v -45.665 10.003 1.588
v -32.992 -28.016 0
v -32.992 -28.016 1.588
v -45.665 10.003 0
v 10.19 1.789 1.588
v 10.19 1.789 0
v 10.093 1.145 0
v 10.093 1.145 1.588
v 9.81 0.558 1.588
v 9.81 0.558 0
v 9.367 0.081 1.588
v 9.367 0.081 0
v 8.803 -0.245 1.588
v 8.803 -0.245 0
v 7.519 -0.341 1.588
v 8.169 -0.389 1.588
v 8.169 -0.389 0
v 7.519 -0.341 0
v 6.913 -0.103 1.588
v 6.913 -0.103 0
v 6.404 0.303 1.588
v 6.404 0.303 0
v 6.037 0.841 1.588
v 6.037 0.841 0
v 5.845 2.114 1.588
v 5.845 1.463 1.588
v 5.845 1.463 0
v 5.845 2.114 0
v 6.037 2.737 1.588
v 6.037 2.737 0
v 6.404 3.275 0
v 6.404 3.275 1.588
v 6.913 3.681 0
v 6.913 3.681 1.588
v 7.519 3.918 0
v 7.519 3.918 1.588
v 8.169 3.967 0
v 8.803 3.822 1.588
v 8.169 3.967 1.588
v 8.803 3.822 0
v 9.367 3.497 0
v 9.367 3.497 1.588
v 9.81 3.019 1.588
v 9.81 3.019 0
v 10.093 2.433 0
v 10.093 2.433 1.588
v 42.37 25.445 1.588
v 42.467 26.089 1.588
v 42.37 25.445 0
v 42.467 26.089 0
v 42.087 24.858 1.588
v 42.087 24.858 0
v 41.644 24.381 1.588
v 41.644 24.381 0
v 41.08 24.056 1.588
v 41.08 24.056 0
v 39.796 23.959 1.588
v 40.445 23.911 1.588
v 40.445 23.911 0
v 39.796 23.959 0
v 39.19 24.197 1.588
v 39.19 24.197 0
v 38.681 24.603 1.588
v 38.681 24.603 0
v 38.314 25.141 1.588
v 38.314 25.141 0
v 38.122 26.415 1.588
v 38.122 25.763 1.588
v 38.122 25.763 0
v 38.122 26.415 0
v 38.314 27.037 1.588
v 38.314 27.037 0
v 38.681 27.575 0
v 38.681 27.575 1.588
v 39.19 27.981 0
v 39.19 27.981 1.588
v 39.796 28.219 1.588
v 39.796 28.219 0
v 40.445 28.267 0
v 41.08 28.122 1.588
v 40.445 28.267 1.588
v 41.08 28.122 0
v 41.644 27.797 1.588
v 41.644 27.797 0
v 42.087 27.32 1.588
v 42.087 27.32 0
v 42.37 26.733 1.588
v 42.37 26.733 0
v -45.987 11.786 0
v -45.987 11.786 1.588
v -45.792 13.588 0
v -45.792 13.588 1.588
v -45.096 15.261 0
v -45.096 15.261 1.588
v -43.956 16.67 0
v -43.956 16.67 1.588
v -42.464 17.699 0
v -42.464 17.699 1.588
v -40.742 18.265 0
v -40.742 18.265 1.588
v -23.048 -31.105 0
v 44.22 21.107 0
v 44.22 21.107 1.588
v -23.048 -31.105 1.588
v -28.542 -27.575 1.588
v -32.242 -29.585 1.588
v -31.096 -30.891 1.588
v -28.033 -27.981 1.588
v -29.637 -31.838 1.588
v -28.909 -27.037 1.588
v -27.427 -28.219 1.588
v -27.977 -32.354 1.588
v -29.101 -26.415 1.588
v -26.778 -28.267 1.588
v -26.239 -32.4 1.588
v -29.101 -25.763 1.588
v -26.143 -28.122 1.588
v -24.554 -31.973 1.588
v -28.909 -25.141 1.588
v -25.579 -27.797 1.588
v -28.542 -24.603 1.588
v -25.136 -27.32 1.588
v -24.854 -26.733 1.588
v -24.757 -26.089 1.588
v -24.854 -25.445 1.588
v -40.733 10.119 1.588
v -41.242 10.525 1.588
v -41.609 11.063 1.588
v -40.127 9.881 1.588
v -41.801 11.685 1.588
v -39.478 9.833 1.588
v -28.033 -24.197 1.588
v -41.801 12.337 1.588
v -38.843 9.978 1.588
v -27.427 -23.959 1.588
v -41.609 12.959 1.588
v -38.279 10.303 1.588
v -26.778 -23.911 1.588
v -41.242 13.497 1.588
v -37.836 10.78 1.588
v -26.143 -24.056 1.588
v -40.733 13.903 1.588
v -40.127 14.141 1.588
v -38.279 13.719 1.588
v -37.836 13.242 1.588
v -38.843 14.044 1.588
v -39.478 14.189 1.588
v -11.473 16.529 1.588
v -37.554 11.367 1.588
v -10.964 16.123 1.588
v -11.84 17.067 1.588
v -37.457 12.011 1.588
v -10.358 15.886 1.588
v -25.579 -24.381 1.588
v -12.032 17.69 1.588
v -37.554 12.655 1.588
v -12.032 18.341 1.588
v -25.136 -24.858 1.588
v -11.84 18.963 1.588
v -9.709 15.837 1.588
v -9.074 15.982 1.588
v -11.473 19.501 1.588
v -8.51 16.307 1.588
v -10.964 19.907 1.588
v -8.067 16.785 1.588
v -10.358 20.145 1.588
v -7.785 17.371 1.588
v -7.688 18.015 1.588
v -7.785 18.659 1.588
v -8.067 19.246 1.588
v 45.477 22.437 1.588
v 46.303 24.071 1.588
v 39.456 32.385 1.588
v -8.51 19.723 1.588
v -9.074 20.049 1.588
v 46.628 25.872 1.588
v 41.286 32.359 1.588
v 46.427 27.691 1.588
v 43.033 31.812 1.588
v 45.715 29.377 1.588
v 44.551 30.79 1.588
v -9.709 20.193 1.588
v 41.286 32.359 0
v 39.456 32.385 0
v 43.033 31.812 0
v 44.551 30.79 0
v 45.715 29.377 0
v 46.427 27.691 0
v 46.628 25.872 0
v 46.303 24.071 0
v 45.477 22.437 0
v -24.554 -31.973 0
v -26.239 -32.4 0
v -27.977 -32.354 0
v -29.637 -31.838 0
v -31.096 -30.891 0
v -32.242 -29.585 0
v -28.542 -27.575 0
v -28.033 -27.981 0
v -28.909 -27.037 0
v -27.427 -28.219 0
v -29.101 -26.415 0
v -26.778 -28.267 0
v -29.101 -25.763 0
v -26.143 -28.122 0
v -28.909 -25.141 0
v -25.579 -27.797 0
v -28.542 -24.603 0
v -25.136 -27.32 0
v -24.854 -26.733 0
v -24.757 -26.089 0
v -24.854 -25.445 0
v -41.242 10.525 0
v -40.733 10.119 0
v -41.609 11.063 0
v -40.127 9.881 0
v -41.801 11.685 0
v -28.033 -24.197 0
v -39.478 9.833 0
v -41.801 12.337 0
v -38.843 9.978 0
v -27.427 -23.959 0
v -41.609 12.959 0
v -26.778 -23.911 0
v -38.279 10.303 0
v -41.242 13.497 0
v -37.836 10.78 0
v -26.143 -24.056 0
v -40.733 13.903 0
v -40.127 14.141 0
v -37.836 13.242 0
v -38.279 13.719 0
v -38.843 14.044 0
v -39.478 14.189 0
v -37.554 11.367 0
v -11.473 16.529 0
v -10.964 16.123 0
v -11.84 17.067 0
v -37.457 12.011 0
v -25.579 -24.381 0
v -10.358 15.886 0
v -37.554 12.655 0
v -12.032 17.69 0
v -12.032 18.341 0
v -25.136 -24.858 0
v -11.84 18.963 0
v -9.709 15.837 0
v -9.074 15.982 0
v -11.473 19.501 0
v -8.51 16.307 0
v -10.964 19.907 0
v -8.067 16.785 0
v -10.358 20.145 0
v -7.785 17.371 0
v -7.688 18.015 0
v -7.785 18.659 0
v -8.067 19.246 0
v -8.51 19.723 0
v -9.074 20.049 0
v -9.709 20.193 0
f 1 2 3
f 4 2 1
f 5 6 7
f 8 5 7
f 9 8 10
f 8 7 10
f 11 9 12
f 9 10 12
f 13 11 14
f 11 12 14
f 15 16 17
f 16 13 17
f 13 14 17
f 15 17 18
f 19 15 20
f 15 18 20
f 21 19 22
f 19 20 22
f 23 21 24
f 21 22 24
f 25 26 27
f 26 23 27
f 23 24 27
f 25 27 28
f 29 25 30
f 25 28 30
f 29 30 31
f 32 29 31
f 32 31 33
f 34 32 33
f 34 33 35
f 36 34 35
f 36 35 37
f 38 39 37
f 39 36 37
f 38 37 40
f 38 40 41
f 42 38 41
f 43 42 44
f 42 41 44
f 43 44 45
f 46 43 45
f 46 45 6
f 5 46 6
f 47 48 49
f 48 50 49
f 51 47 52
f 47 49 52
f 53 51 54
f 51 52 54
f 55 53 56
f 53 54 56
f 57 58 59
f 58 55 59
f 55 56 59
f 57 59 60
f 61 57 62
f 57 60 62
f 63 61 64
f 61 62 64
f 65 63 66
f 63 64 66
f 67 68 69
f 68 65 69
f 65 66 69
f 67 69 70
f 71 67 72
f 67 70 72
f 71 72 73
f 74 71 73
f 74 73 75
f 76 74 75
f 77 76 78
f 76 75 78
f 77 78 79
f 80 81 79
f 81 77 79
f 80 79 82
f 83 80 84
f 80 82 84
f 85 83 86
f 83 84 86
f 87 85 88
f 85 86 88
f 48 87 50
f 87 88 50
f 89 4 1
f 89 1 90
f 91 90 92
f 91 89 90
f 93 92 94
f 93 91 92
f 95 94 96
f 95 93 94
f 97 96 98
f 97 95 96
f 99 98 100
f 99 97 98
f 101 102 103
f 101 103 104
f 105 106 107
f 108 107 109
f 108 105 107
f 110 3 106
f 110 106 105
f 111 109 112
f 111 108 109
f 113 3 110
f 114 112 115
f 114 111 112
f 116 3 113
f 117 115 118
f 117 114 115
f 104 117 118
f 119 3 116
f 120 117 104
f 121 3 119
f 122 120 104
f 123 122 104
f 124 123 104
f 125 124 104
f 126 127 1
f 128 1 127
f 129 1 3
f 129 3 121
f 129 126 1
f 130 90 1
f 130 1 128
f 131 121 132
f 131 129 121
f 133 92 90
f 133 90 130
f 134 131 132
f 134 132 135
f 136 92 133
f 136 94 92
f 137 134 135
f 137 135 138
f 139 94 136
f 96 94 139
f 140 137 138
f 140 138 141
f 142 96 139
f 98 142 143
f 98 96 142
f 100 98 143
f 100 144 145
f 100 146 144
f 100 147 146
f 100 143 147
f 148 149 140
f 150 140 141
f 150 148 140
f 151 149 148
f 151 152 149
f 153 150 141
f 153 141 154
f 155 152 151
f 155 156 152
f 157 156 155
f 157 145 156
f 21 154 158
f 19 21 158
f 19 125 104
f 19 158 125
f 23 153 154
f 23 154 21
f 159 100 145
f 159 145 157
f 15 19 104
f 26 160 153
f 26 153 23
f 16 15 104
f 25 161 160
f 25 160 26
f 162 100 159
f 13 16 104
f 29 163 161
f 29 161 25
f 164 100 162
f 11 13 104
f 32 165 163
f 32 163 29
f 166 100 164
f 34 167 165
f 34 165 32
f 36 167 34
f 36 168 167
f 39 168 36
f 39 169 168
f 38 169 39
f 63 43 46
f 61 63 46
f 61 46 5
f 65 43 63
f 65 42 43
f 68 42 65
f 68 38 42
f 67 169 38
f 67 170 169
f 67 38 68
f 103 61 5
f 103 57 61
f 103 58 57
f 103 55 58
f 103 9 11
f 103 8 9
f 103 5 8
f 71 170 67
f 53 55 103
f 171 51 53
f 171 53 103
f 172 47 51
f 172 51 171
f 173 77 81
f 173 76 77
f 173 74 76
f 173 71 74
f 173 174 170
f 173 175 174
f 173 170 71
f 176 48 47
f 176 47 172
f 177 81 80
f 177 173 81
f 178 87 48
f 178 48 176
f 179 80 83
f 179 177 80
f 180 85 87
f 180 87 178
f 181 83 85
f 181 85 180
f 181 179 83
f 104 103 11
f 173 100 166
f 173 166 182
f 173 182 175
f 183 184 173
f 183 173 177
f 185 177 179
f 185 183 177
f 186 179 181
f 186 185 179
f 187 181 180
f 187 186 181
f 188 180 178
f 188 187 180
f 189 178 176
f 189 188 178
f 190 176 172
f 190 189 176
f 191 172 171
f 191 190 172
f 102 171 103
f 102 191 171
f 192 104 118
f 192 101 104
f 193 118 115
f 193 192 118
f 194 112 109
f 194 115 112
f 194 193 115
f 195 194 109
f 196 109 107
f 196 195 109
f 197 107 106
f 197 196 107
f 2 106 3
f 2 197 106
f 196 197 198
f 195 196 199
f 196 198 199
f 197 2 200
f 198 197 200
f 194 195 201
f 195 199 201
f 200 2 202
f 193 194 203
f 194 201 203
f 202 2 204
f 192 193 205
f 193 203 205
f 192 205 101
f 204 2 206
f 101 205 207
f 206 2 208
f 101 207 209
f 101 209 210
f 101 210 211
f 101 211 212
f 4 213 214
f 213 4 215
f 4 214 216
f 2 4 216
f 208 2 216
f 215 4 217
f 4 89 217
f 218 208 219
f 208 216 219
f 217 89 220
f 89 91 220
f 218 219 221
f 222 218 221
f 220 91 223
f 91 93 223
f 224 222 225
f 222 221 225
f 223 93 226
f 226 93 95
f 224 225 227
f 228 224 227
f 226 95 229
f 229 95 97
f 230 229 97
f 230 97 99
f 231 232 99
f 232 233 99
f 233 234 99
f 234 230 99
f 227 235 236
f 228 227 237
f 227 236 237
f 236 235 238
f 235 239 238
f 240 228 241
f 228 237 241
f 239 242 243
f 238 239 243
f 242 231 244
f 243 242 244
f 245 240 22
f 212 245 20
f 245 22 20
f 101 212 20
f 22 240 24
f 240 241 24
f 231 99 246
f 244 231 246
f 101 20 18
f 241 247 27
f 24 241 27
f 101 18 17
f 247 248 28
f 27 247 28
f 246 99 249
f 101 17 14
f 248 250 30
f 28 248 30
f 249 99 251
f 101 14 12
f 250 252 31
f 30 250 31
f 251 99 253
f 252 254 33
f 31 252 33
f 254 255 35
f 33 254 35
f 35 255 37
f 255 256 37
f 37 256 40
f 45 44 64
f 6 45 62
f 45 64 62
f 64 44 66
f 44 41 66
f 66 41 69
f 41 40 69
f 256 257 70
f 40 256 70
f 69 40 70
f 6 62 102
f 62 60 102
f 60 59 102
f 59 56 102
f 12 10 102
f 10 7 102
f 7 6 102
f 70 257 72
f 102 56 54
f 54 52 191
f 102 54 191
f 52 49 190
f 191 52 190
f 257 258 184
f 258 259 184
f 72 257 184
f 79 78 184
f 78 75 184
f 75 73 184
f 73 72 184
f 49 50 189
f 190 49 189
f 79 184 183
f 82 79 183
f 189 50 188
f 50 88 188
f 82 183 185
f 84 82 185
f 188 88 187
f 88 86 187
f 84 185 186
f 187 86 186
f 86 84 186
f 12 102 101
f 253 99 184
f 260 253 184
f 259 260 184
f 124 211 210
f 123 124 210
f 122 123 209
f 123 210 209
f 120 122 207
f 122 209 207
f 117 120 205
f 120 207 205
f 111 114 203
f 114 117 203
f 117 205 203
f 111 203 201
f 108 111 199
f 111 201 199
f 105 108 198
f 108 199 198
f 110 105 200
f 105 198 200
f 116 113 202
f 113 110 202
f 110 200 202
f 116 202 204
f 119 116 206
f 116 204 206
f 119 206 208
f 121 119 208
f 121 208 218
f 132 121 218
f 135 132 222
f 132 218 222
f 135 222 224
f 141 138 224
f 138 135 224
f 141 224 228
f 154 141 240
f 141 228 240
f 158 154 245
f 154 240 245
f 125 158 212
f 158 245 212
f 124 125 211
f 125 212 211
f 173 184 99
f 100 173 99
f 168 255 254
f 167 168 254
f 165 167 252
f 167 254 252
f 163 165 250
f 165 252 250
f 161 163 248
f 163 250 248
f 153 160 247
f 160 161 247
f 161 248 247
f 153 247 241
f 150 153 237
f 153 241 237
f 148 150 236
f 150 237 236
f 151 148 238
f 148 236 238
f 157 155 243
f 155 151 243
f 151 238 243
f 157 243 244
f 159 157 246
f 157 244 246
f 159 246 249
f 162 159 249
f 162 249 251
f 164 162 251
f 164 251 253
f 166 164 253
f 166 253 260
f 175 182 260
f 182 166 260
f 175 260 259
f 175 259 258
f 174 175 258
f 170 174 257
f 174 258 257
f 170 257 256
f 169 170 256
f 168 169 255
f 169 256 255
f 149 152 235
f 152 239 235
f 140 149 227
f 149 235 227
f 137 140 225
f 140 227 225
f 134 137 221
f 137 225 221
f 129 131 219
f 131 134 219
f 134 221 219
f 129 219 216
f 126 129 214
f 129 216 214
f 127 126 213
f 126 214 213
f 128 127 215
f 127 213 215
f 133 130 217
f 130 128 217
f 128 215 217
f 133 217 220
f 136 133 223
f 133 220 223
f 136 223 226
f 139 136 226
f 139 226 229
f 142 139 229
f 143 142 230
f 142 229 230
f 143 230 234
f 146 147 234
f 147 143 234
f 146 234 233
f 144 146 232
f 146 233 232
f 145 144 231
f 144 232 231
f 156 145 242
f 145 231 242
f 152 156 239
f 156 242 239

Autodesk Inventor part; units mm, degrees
ref_plane "YZ Plane" through (0, 0, 0) normal (1, 0, 0) x (0, 1, 0)
ref_plane "XZ Plane" through (0, 0, 0) normal (0, 1, 0) x (-1, 0, 0)
ref_plane "XY Plane" through (0, 0, 0) normal (0, 0, 1) x (1, 0, 0)
sketch "Sketch2" plane through (0, 0, 0) normal (0, 0, 1) x (1, 0, 0)
  circle A0 centre (-9.8721, 18.0152) radius 2.1844
  circle A1 centre (40.2822, 26.089) radius 2.1844
  circle A2 centre (-26.9412, -26.089) radius 2.1844
  circle A3 centre (-39.6412, 12.011) radius 2.1844
  circle A4 centre (8.0053, 1.7888) radius 2.1844
  circle A5 centre (40.2822, 26.089) radius 6.35
  circle A6 centre (-26.9412, -26.089) radius 6.35
  line L0 (44.2198, 21.1073) -> (-23.0477, -31.1053)
  circle A7 centre (-39.6412, 12.011) radius 6.35
  line L1 (-32.9918, -28.0161) -> (-45.6653, 10.0028)
  line L2 (39.4559, 32.385) -> (-40.7423, 18.2648)
  point P0 (0, 0)
  dimension "d12" = 12.7
  dimension "d13" = 12.7
  dimension "d14" = 12.7
extrude "Extrusion2" add sketch "Sketch2" along normal blind 1.5875 contours A5 L0 A6 L1 A7 L2 | A6 | A7
properties part number "Lbsupportpoly"
